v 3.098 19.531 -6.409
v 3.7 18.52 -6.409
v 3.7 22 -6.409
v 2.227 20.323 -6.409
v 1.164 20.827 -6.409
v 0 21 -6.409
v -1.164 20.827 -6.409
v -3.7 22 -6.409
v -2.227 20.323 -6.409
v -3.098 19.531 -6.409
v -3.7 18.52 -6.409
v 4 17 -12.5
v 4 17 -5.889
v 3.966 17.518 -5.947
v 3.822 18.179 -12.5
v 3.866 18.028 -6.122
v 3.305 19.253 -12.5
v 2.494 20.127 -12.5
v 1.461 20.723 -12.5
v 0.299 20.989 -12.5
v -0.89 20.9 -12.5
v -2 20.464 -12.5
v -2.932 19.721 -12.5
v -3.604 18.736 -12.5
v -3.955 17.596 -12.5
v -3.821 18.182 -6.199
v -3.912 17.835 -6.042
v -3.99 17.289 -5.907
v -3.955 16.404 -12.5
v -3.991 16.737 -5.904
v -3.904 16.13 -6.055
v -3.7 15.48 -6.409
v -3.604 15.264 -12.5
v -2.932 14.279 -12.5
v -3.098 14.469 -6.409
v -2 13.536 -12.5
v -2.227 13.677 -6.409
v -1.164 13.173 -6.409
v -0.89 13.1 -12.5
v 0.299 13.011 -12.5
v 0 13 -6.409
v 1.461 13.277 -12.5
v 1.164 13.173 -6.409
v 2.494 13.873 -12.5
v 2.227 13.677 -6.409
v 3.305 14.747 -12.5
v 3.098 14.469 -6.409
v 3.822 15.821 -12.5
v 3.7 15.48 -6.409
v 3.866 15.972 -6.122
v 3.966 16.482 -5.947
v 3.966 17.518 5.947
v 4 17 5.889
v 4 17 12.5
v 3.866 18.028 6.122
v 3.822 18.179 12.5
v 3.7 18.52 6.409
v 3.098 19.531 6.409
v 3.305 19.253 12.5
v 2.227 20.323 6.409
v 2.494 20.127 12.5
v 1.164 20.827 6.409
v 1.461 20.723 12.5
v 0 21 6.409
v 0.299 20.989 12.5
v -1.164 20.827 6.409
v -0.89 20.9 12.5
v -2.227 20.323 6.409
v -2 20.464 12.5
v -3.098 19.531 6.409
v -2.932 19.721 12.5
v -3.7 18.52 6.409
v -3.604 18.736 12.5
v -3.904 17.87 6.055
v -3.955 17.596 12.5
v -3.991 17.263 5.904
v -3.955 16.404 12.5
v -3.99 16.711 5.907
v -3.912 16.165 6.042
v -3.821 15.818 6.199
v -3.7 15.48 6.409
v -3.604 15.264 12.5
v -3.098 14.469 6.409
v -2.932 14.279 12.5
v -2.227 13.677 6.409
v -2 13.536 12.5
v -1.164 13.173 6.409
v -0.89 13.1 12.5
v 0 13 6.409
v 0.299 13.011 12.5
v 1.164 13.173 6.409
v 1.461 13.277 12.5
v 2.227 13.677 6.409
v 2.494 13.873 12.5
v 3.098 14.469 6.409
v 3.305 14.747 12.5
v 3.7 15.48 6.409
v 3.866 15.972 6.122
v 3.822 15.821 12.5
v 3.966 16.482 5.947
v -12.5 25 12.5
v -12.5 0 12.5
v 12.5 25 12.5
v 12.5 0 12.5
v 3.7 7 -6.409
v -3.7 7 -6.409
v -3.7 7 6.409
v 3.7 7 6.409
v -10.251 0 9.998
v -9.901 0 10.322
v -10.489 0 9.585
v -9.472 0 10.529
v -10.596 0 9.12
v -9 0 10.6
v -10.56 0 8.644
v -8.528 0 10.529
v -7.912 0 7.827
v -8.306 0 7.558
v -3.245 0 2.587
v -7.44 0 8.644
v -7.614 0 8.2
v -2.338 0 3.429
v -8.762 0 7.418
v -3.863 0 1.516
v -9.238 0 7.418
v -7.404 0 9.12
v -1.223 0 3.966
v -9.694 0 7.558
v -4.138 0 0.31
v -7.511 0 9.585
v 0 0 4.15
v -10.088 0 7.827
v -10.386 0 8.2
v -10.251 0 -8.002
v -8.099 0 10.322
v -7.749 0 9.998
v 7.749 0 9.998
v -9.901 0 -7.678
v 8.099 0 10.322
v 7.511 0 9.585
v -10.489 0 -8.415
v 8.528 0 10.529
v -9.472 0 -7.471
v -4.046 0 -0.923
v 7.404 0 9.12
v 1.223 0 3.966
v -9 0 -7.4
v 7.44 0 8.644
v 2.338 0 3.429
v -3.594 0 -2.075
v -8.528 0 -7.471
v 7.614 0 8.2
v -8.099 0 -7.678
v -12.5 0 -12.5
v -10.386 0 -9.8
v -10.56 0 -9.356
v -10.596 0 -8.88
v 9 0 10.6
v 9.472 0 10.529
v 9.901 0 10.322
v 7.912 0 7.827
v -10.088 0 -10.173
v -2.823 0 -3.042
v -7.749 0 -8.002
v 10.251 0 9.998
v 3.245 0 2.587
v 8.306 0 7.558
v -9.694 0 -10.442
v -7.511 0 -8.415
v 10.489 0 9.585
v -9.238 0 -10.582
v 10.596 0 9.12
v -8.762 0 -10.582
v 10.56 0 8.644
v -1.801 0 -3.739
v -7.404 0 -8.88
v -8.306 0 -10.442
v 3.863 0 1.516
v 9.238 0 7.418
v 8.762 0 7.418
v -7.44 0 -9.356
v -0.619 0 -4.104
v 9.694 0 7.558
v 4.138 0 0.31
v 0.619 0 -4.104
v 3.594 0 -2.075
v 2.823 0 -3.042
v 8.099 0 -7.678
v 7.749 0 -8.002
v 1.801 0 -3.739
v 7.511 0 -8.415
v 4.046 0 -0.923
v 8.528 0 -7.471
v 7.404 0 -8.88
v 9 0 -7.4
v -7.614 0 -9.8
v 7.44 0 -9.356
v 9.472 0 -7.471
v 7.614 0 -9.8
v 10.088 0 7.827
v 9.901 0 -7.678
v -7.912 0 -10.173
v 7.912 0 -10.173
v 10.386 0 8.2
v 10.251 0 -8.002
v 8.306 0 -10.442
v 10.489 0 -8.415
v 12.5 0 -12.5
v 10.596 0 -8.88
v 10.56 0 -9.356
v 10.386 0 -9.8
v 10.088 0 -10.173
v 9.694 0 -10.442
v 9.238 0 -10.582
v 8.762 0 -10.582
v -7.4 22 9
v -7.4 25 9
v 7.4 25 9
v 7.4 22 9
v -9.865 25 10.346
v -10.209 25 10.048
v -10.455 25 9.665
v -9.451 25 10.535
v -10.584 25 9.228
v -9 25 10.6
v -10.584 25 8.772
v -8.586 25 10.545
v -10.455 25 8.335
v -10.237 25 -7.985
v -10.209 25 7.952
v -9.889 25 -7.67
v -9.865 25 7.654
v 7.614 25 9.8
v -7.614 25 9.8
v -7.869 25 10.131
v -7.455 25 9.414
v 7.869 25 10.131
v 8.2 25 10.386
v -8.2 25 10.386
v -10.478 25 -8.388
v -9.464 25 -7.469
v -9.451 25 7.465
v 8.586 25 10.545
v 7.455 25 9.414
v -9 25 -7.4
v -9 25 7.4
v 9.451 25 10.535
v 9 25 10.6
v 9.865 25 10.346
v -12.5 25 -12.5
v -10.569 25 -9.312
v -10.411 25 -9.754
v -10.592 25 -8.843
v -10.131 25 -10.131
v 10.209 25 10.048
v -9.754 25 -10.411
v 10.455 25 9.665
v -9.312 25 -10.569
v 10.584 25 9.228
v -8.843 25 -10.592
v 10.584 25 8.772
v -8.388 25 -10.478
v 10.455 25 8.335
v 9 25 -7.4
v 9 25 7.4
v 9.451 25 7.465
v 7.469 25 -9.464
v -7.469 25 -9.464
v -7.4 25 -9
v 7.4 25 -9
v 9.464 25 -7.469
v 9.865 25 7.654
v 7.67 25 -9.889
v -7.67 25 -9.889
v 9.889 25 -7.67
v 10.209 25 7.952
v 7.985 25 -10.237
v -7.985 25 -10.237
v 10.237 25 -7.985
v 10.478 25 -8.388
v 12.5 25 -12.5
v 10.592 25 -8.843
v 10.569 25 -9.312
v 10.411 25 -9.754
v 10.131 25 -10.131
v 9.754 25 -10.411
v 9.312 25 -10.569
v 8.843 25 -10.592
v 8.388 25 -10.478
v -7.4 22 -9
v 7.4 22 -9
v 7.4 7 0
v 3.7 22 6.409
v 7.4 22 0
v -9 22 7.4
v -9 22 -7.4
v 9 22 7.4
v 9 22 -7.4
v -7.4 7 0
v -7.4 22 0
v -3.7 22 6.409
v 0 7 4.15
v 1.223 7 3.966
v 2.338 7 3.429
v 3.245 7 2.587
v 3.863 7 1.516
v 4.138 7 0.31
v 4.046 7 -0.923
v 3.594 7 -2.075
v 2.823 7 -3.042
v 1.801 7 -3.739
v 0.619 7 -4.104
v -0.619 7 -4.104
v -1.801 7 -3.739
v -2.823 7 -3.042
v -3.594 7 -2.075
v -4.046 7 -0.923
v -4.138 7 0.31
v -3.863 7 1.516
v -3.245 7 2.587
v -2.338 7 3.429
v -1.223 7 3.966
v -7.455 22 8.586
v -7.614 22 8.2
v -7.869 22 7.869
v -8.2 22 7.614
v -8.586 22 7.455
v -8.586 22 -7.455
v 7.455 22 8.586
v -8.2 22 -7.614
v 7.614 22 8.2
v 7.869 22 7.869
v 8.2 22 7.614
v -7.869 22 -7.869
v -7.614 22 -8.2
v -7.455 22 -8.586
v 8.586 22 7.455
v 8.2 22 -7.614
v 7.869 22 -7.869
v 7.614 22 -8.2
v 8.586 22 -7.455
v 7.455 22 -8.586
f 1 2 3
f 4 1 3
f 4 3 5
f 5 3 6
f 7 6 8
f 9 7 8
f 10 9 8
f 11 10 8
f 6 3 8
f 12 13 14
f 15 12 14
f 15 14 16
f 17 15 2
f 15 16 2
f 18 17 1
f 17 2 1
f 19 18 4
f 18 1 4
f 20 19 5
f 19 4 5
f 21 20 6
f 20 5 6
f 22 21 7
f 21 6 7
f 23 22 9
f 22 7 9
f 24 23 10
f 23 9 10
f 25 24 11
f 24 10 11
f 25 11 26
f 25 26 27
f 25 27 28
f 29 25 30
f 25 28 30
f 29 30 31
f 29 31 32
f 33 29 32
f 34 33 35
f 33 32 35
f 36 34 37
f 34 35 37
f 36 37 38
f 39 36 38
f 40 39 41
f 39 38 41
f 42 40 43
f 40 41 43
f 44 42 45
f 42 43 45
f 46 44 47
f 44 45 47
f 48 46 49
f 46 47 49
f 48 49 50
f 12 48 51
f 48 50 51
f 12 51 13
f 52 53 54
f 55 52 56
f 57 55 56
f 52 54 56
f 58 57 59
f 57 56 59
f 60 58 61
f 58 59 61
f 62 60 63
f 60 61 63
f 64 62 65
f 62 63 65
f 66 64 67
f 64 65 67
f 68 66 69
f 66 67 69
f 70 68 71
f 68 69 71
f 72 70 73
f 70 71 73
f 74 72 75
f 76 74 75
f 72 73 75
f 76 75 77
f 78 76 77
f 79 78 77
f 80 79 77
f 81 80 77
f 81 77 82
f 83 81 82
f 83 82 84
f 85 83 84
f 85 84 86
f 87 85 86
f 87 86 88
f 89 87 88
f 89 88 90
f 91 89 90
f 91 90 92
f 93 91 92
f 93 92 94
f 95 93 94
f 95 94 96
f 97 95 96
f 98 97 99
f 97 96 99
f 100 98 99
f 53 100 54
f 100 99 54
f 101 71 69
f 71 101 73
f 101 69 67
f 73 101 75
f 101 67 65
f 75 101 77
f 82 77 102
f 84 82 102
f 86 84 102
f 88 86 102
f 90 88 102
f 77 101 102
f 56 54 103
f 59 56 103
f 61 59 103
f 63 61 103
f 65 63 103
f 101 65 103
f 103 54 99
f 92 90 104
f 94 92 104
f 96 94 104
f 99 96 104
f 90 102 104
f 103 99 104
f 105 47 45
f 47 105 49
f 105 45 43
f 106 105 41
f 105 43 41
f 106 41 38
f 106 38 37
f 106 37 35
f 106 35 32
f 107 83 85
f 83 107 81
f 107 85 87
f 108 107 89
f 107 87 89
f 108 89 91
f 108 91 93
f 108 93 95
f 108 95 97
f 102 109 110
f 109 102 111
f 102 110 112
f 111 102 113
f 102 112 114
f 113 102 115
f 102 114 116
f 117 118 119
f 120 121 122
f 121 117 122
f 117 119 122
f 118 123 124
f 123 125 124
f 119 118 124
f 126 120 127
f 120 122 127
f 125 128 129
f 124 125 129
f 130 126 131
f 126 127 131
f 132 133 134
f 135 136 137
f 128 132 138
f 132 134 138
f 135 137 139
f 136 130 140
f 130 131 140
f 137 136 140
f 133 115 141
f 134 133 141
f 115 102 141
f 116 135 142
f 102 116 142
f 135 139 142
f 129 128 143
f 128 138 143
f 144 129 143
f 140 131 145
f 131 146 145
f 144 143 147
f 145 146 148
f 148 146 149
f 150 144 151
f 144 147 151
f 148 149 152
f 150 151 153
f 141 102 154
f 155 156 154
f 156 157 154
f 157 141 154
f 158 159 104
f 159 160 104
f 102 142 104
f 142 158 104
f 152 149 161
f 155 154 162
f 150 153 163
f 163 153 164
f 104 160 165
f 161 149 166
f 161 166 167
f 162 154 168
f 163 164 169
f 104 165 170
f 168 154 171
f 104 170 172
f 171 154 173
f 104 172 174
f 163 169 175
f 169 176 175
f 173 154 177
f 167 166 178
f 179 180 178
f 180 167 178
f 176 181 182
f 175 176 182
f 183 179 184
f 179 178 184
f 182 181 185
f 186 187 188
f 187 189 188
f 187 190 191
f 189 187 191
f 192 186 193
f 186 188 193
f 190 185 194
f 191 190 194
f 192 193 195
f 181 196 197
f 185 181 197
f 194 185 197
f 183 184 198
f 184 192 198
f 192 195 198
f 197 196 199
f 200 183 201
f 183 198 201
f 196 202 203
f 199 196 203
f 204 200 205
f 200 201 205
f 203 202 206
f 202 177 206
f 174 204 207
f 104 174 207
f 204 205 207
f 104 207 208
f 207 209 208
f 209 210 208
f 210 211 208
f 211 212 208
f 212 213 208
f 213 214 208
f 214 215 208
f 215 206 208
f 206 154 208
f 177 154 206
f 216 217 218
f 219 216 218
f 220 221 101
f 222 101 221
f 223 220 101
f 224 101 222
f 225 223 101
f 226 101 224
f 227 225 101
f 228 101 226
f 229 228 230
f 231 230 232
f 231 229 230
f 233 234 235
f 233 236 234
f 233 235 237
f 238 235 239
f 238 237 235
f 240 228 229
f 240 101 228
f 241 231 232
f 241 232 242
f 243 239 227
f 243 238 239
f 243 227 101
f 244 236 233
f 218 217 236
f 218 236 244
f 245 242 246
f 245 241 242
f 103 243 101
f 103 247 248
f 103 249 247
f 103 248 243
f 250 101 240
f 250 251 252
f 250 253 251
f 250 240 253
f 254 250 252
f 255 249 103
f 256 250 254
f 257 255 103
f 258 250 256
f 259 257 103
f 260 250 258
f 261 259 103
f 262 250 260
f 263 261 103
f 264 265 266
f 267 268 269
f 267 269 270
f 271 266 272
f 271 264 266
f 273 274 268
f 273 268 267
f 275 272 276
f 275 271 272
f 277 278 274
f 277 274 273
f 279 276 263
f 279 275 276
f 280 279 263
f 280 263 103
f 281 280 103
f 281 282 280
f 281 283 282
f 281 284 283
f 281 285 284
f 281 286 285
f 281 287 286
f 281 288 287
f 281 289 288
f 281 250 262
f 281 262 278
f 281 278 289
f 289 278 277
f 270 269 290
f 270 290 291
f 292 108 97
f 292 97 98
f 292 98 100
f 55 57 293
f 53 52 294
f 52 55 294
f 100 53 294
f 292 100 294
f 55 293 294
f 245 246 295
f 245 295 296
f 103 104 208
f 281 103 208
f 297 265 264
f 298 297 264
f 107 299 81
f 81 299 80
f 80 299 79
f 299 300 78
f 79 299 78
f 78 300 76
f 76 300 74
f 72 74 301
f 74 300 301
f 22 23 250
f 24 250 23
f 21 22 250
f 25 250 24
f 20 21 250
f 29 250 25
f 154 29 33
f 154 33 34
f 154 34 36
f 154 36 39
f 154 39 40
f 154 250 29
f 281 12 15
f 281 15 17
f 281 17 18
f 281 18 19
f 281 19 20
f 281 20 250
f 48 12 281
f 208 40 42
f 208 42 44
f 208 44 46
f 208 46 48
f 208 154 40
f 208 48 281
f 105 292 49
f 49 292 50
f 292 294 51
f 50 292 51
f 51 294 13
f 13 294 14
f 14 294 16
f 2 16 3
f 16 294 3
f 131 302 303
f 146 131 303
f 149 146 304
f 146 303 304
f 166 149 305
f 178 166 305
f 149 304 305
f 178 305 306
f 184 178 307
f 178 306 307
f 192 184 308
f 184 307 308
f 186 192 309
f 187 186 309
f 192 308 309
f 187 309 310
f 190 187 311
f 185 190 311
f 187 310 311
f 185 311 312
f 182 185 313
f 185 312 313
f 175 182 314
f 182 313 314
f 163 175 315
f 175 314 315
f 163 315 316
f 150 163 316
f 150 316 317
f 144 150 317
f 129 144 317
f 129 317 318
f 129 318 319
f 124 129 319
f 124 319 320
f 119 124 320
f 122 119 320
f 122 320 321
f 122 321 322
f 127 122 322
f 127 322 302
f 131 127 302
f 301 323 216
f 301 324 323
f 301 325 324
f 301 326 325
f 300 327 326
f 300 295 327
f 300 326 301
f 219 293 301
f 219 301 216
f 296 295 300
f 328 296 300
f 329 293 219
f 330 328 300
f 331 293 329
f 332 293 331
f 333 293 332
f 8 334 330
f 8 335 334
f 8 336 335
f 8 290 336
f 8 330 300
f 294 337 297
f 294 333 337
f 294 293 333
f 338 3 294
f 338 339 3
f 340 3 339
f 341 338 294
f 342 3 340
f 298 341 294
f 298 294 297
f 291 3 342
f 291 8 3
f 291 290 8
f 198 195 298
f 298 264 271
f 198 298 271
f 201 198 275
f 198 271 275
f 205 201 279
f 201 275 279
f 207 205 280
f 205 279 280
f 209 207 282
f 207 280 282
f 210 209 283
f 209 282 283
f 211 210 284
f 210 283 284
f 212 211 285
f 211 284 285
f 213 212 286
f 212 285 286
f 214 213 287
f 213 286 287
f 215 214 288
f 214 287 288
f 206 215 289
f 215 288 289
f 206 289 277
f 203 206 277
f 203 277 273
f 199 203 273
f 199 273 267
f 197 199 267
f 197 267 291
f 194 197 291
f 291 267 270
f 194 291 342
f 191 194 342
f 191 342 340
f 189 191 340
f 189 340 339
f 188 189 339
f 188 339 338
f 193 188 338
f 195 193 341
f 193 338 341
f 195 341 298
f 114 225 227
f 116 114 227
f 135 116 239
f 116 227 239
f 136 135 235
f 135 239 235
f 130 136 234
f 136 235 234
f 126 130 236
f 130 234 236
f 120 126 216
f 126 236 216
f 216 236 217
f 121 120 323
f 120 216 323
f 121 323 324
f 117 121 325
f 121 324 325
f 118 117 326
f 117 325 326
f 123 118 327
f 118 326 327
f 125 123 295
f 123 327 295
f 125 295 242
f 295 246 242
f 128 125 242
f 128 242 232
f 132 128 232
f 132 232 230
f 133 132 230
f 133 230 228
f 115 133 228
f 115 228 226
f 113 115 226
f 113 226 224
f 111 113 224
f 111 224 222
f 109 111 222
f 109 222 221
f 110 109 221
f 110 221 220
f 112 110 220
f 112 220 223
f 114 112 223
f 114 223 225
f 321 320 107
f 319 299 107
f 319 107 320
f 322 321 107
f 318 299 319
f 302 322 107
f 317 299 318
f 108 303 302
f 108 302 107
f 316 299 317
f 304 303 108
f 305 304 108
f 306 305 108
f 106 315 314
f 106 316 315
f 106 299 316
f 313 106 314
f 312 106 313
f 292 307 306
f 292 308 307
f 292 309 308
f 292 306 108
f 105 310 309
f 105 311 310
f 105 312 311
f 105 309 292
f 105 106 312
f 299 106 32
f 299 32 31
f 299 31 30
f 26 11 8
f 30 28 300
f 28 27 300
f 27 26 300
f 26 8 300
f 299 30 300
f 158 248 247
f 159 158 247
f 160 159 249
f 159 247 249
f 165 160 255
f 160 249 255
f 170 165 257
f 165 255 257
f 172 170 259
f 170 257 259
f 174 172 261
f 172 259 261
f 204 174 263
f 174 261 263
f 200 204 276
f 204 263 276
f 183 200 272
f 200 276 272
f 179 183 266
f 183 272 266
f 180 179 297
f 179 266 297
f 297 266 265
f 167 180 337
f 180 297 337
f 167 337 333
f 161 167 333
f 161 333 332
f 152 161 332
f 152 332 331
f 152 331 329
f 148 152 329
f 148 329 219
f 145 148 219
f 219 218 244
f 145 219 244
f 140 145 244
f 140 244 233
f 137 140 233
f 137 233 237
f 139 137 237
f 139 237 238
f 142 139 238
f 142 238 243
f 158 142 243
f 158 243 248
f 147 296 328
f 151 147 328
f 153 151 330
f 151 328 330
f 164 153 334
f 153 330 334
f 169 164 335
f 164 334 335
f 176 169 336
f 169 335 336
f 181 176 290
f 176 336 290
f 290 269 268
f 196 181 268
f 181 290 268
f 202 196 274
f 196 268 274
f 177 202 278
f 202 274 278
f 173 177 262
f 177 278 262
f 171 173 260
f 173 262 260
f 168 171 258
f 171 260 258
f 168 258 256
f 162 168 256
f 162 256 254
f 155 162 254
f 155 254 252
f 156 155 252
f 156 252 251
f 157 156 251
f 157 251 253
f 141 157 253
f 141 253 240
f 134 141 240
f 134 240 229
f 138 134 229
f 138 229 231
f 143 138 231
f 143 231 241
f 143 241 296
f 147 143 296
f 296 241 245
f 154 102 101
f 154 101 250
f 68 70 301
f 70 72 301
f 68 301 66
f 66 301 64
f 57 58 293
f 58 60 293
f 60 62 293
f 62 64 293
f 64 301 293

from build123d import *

# Parameters (mm, degrees)
SKETCH1_W           = 25
SKETCH1_H           = 25
BOSS_EXTRUDE1_DEPTH = 25
SKETCH2_R           = 4
CUT_EXTRUDE1_DEPTH  = 26
SKETCH4_R           = 4.15
CUT_EXTRUDE2_DEPTH  = 26
CUT_EXTRUDE3_DEPTH  = 18
SKETCH6_R           = 1.6
CUT_EXTRUDE4_DEPTH  = 26
SKETCH7_W           = 18
SKETCH7_H           = 18
CUT_EXTRUDE5_DEPTH  = 3


with BuildPart() as part:
    # Sketch1 → Boss-Extrude1 (new body)
    with BuildSketch(Plane(origin=(0, 0, 0), x_dir=(1, 0, 0), z_dir=(0, 1, 0))):
        Rectangle(SKETCH1_W, SKETCH1_H)
    extrude(amount=BOSS_EXTRUDE1_DEPTH)

    # Sketch2 → Cut-Extrude1 (cut, through all)
    with BuildSketch(Plane.XY.offset(12.5)):
        with Locations((0, 17)):
            Circle(SKETCH2_R)
    extrude(amount=-CUT_EXTRUDE1_DEPTH, mode=Mode.SUBTRACT)

    # Sketch4 → Cut-Extrude2 (cut, through all)
    with BuildSketch(Plane(origin=(0, 25, 0), x_dir=(1, 0, 0), z_dir=(0, 1, 0))):
        with Locations(Location((0, 0, 0), (0, 0, 270))):  # turned: the seam where the file's is
            Circle(SKETCH4_R)
    extrude(amount=-CUT_EXTRUDE2_DEPTH, mode=Mode.SUBTRACT)

    # Sketch5 → Cut-Extrude3 (cut)
    with BuildSketch(Plane(origin=(0, 25, 0), x_dir=(1, 0, 0), z_dir=(0, 1, 0))):
        Polygon((-3.7, -6.408587988), (3.7, -6.408587988), (7.4, 0), (3.7, 6.408587988), (-3.7, 6.408587988), (-7.4, 0), align=None)
    extrude(amount=-CUT_EXTRUDE3_DEPTH, mode=Mode.SUBTRACT)

    # Sketch6 → Cut-Extrude4 (cut, through all)
    with BuildSketch(Plane(origin=(0, 25, 0), x_dir=(1, 0, 0), z_dir=(0, 1, 0))):
        with Locations(Location((9, -9, 0), (0, 0, 270))):  # turned: the seam where the file's is
            Circle(SKETCH6_R)
        with Locations(Location((-9, -9, 0), (0, 0, 270))):  # turned: the seam where the file's is
            Circle(SKETCH6_R)
        with Locations(Location((-9, 9, 0), (0, 0, 270))):  # turned: the seam where the file's is
            Circle(SKETCH6_R)
        with Locations(Location((9, 9, 0), (0, 0, 270))):  # turned: the seam where the file's is
            Circle(SKETCH6_R)
    extrude(amount=-CUT_EXTRUDE4_DEPTH, mode=Mode.SUBTRACT)

    # Sketch7 → Cut-Extrude5 (cut)
    with BuildSketch(Plane(origin=(0, 25, 0), x_dir=(1, 0, 0), z_dir=(0, 1, 0))):
        Rectangle(SKETCH7_W, SKETCH7_H)
    extrude(amount=-CUT_EXTRUDE5_DEPTH, mode=Mode.SUBTRACT)


solid = part.part
